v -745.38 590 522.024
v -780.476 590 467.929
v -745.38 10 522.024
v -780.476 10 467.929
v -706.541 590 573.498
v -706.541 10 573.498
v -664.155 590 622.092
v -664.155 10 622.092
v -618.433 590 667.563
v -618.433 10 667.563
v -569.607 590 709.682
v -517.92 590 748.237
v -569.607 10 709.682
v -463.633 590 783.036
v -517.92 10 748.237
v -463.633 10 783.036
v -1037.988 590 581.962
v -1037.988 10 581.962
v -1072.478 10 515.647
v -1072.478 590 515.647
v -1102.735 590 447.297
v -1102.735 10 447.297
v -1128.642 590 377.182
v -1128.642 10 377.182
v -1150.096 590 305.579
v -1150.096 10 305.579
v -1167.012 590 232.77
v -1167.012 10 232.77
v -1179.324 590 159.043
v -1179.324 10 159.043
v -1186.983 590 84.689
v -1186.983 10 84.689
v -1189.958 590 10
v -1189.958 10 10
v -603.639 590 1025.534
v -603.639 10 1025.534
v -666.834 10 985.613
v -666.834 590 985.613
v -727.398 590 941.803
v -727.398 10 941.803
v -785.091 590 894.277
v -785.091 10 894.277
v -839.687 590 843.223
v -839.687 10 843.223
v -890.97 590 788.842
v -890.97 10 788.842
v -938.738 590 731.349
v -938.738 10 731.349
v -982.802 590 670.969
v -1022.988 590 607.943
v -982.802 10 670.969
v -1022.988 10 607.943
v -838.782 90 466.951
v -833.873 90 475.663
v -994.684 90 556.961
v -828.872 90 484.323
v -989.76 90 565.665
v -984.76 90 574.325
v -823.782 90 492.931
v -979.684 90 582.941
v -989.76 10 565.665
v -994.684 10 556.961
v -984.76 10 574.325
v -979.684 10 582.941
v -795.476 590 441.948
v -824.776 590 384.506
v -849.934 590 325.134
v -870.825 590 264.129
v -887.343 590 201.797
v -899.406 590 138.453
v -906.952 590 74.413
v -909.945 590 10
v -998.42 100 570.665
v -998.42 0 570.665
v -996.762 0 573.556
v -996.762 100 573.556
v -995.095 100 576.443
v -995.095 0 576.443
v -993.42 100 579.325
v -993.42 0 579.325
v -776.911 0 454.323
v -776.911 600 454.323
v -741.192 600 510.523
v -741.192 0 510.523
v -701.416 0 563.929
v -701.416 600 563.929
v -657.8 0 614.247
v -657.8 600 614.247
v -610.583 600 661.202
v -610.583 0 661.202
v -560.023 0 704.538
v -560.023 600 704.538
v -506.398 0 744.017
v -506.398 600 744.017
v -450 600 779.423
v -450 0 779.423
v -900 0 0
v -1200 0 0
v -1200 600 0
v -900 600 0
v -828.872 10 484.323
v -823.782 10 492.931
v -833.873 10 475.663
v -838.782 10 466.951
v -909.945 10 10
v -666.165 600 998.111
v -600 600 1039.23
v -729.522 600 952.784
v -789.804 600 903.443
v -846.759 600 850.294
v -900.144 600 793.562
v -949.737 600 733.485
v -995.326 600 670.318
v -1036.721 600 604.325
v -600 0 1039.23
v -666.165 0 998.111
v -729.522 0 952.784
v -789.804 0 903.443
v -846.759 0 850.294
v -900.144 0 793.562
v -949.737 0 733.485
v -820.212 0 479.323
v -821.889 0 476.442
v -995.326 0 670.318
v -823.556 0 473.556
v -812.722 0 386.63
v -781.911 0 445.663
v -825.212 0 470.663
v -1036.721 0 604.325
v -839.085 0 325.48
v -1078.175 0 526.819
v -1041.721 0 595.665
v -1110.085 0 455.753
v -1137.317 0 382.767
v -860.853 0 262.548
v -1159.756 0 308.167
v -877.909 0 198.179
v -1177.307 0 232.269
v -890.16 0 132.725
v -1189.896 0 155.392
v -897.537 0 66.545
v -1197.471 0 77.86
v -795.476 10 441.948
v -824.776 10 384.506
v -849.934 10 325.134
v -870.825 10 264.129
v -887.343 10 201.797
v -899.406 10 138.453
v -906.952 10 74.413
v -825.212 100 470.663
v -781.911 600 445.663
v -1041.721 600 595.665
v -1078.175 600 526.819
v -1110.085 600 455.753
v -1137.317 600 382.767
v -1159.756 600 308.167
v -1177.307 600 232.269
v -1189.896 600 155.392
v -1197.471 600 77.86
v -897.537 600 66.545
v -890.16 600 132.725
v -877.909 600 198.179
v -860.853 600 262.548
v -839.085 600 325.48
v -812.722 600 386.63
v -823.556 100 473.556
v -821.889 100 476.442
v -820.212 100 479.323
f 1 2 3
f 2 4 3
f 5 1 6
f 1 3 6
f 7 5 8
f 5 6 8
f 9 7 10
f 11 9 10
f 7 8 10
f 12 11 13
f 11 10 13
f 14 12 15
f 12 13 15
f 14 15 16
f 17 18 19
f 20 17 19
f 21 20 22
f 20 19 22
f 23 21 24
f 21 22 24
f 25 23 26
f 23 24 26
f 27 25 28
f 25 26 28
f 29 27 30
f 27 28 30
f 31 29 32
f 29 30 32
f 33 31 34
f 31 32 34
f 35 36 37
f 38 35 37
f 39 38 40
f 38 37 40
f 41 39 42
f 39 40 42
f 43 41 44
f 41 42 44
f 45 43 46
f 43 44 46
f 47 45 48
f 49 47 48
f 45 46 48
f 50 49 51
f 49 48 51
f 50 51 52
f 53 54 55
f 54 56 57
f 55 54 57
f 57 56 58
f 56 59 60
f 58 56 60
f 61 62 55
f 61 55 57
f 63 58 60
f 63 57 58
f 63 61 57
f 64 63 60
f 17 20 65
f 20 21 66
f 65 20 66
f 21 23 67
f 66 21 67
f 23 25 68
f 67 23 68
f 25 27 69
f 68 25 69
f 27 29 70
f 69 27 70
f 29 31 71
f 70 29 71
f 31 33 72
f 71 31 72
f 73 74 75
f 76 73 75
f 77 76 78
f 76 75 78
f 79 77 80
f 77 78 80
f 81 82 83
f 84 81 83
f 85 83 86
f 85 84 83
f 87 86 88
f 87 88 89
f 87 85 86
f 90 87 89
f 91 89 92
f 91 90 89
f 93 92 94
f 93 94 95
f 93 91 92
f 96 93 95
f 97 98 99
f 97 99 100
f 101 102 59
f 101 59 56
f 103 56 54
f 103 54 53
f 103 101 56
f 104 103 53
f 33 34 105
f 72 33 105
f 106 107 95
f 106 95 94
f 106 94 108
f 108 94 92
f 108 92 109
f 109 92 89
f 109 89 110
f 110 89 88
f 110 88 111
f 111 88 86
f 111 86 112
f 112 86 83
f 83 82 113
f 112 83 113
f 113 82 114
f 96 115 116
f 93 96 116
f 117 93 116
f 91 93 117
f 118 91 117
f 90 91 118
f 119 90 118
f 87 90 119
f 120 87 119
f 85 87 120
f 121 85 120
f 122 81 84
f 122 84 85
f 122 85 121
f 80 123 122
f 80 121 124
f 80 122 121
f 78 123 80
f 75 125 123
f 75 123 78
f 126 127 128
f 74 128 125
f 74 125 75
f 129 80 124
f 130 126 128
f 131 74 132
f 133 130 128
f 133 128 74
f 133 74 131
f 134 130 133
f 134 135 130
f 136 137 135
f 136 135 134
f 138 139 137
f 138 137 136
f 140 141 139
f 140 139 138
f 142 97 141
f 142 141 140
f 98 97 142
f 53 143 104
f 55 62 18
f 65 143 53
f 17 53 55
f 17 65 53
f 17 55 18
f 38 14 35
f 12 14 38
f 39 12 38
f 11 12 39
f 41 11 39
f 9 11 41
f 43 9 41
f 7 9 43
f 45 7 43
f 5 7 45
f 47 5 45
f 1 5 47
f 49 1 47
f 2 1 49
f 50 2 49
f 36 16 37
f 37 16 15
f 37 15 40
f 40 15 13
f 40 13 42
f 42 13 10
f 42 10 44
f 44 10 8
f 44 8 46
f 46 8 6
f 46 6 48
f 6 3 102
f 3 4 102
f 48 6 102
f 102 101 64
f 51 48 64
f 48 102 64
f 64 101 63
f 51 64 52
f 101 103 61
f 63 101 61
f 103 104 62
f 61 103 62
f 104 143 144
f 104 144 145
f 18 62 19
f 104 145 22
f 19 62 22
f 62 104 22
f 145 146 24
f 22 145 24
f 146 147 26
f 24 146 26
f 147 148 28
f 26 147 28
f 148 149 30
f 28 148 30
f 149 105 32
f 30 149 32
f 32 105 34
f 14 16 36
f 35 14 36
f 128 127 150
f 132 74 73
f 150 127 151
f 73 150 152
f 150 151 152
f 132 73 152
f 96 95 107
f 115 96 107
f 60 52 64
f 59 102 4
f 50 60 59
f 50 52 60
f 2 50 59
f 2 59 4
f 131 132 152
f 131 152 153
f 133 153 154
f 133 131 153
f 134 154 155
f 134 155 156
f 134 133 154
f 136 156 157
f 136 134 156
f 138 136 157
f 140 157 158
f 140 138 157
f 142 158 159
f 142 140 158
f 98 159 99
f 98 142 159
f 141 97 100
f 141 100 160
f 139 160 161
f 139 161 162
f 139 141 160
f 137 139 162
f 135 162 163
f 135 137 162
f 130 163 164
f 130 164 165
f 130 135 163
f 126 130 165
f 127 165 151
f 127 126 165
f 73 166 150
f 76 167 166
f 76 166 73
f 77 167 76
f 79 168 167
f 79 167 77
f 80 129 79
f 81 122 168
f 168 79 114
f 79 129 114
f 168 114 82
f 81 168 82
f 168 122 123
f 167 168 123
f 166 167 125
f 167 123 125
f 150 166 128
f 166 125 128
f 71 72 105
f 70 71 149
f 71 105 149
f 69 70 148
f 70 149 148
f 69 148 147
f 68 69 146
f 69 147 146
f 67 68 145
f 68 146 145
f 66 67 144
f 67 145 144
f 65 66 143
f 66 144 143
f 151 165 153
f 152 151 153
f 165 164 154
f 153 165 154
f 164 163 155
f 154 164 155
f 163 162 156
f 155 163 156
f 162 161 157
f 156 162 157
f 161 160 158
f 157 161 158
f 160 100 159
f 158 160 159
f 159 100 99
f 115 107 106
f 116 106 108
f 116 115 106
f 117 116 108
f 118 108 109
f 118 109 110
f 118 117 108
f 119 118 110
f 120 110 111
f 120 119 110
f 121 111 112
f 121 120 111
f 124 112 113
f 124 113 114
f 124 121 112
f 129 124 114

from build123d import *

# Parameters (mm, degrees)
EXTRUDE_1_DEPTH     = 600
CUT_EXTRUDE_1_DEPTH = 600
EXTRUDE_2_DEPTH     = 100
SHELL_1_T           = -10
EXTRUDE_3_DEPTH     = 10


with BuildPart() as part:
    # 草图1 → 凸台-拉伸1 (new body)
    with BuildSketch(Plane(origin=(0, 0, 0), x_dir=(1, 0, 0), z_dir=(0, 1, 0))):
        with BuildLine():
            ThreePointArc((-900, 0), (-779.422863406, -450), (-450, -779.422863406))
            Line((-450, -779.422863406), (-600, -1039.230484541))
            ThreePointArc((-600, -1039.230484541), (-1039.230484541, -600), (-1200, 0))
            Line((-1200, 0), (-900, 0))
        make_face()
    extrude(amount=EXTRUDE_1_DEPTH)

    # 草图2 → 切除-拉伸1 (cut)
    with BuildSketch(Plane(origin=(0, 600, 0), x_dir=(1, 0, 0), z_dir=(0, 1, 0))):
        Polygon((-57.795907874, -27.594980277), (-1097.026392415, -627.594980277), (-1080.637446236, -629.679823172), (-41.406961694, -29.679823172), align=None)
    extrude(amount=-CUT_EXTRUDE_1_DEPTH, mode=Mode.SUBTRACT)


with BuildPart() as cut_extrude_1_piece_1:
    # of the separate pieces the step leaves, piece 1, a body of its own (cut_extrude_1_pieces)
    add(part.part.solids().sort_by_distance((-600, 0, 1039.230484541))[0])



with BuildPart() as cut_extrude_1_piece_2:
    # of the separate pieces the step leaves, piece 2, a body of its own (cut_extrude_1_pieces)
    add(part.part.solids().sort_by_distance((-1200, 0, 0))[0])


with BuildPart() as cut_extrude_1_piece_1_1:
    add(cut_extrude_1_piece_1.part)

    add(cut_extrude_1_piece_2.part)  # 凸台-拉伸2 merges 切除-拉伸1 piece 2
    # 草图3 → 凸台-拉伸2 (add)
    with BuildSketch(Plane.XZ):
        with BuildLine():
            Line((-825.212105372, 470.662928483), (-998.420193215, 570.664664625))
            ThreePointArc((-998.420193215, 570.664664625), (-995.929606575, 575.00022645), (-993.420193215, 579.324918663))
            Line((-993.420193215, 579.324918663), (-820.212105372, 479.323182521))
            ThreePointArc((-820.212105372, 479.323182521), (-822.723500531, 474.9996345), (-825.212105372, 470.662928483))
        make_face()
    extrude(amount=-EXTRUDE_2_DEPTH)

    # 抽壳1
    shell_1_openings = [cut_extrude_1_piece_1_1.faces().sort_by_distance(p)[0] for p in [
        (-1010.404998502, 600, 268.177938118),
        (-737.451406396, 600, 740.947427754),
    ]]
    offset(amount=SHELL_1_T, openings=shell_1_openings, kind=Kind.INTERSECTION)

    # 草图4 → 凸台-拉伸3 (add)
    with BuildSketch(Plane(origin=(0, 600, 0), x_dir=(1, 0, 0), z_dir=(0, 1, 0))):
        with BuildLine():
            Line((-463.632780681, -783.035532194), (-603.639245264, -1025.533842239))
            ThreePointArc((-603.639245264, -1025.533842239), (-839.687348019, -843.223076995), (-1022.988355102, -607.943110271))
            Line((-1022.988355102, -607.943110271), (-780.47604659, -467.928563671))
            ThreePointArc((-780.47604659, -467.928563671), (-641.696808412, -645.232675919), (-463.632780681, -783.035532194))
        make_face()
        with BuildLine():
            Line((-909.945053286, -10), (-1189.957982451, -10))
            ThreePointArc((-1189.957982451, -10), (-1150.096279744, -305.579036124), (-1037.988355102, -581.962348158))
            Line((-1037.988355102, -581.962348158), (-795.47604659, -441.947801557))
            ThreePointArc((-795.47604659, -441.947801557), (-879.636292904, -233.109399653), (-909.945053286, -10))
        make_face()
    extrude(amount=-EXTRUDE_3_DEPTH)


solid = cut_extrude_1_piece_1_1.part
